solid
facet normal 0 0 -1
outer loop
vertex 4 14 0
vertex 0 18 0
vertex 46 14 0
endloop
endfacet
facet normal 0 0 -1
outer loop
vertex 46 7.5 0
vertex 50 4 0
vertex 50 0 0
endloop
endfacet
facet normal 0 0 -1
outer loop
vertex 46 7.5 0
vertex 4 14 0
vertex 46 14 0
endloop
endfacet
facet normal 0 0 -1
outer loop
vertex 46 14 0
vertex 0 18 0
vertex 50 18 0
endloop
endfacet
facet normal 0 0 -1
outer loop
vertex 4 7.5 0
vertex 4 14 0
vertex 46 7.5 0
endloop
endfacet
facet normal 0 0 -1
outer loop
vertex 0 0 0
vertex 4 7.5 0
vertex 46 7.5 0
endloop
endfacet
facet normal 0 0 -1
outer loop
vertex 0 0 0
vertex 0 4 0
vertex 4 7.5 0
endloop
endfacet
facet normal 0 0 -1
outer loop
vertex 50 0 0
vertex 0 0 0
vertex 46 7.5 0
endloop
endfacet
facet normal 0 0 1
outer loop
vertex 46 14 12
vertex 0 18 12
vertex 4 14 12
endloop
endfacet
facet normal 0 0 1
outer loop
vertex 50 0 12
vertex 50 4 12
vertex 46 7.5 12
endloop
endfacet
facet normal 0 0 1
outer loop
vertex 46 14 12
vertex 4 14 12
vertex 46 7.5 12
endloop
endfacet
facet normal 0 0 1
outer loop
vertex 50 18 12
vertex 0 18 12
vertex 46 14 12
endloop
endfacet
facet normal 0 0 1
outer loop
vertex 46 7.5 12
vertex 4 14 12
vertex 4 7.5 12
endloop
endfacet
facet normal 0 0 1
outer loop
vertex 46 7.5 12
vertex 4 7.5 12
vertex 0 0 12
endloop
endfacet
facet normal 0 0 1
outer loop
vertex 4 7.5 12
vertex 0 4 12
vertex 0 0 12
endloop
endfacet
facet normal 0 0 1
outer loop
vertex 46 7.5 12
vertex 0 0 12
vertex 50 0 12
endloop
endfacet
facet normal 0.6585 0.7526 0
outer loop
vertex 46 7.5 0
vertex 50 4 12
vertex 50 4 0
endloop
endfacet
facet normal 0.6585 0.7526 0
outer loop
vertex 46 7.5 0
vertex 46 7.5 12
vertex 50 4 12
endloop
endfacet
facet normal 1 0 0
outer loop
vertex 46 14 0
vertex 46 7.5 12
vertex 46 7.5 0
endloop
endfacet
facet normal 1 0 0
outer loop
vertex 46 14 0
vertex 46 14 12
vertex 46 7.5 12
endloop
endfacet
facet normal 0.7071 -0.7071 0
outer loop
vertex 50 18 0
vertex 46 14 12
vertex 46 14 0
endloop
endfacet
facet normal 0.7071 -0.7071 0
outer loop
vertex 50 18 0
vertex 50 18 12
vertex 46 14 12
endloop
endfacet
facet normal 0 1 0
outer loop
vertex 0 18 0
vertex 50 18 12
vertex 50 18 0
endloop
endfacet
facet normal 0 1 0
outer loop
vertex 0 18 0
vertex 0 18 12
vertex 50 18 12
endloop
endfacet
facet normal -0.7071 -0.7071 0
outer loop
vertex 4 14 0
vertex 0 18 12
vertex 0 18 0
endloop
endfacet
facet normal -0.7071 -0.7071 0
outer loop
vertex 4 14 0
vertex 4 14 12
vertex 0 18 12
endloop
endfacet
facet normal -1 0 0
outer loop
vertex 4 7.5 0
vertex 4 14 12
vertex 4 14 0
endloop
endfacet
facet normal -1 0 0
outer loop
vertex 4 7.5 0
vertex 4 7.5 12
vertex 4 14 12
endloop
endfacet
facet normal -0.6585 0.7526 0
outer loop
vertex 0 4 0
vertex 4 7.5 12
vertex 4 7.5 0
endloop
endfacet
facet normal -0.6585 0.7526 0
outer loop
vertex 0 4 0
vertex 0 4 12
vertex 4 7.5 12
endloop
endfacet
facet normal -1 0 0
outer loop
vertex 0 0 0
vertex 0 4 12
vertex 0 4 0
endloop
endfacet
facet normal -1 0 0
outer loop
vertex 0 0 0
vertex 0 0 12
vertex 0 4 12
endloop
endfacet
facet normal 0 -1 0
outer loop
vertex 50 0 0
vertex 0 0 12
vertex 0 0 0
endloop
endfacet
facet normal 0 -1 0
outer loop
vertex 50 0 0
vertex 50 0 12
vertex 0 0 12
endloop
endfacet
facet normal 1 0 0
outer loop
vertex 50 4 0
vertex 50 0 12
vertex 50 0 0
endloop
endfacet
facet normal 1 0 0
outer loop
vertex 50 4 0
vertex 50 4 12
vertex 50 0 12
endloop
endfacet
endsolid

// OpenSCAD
$fn = 32;

// ----------------------------------------------------------------------
// Key bar: dovetail key, 12 mm thick
// ----------------------------------------------------------------------

// --- parameters (mm) ---
profile_height = 12;      // extrusion height
profile_points = 10;      // points of the closed outline

profile = [[0, 0], [50, 0], [50, 4], [46, 7.5], [46, 14], [50, 18], [0, 18], [4, 14], [4, 7.5], [0, 4]];  // single closed polygon, 10 points, counter clockwise

// --- the one profile operation ---
linear_extrude(height = profile_height) polygon(points = profile);
